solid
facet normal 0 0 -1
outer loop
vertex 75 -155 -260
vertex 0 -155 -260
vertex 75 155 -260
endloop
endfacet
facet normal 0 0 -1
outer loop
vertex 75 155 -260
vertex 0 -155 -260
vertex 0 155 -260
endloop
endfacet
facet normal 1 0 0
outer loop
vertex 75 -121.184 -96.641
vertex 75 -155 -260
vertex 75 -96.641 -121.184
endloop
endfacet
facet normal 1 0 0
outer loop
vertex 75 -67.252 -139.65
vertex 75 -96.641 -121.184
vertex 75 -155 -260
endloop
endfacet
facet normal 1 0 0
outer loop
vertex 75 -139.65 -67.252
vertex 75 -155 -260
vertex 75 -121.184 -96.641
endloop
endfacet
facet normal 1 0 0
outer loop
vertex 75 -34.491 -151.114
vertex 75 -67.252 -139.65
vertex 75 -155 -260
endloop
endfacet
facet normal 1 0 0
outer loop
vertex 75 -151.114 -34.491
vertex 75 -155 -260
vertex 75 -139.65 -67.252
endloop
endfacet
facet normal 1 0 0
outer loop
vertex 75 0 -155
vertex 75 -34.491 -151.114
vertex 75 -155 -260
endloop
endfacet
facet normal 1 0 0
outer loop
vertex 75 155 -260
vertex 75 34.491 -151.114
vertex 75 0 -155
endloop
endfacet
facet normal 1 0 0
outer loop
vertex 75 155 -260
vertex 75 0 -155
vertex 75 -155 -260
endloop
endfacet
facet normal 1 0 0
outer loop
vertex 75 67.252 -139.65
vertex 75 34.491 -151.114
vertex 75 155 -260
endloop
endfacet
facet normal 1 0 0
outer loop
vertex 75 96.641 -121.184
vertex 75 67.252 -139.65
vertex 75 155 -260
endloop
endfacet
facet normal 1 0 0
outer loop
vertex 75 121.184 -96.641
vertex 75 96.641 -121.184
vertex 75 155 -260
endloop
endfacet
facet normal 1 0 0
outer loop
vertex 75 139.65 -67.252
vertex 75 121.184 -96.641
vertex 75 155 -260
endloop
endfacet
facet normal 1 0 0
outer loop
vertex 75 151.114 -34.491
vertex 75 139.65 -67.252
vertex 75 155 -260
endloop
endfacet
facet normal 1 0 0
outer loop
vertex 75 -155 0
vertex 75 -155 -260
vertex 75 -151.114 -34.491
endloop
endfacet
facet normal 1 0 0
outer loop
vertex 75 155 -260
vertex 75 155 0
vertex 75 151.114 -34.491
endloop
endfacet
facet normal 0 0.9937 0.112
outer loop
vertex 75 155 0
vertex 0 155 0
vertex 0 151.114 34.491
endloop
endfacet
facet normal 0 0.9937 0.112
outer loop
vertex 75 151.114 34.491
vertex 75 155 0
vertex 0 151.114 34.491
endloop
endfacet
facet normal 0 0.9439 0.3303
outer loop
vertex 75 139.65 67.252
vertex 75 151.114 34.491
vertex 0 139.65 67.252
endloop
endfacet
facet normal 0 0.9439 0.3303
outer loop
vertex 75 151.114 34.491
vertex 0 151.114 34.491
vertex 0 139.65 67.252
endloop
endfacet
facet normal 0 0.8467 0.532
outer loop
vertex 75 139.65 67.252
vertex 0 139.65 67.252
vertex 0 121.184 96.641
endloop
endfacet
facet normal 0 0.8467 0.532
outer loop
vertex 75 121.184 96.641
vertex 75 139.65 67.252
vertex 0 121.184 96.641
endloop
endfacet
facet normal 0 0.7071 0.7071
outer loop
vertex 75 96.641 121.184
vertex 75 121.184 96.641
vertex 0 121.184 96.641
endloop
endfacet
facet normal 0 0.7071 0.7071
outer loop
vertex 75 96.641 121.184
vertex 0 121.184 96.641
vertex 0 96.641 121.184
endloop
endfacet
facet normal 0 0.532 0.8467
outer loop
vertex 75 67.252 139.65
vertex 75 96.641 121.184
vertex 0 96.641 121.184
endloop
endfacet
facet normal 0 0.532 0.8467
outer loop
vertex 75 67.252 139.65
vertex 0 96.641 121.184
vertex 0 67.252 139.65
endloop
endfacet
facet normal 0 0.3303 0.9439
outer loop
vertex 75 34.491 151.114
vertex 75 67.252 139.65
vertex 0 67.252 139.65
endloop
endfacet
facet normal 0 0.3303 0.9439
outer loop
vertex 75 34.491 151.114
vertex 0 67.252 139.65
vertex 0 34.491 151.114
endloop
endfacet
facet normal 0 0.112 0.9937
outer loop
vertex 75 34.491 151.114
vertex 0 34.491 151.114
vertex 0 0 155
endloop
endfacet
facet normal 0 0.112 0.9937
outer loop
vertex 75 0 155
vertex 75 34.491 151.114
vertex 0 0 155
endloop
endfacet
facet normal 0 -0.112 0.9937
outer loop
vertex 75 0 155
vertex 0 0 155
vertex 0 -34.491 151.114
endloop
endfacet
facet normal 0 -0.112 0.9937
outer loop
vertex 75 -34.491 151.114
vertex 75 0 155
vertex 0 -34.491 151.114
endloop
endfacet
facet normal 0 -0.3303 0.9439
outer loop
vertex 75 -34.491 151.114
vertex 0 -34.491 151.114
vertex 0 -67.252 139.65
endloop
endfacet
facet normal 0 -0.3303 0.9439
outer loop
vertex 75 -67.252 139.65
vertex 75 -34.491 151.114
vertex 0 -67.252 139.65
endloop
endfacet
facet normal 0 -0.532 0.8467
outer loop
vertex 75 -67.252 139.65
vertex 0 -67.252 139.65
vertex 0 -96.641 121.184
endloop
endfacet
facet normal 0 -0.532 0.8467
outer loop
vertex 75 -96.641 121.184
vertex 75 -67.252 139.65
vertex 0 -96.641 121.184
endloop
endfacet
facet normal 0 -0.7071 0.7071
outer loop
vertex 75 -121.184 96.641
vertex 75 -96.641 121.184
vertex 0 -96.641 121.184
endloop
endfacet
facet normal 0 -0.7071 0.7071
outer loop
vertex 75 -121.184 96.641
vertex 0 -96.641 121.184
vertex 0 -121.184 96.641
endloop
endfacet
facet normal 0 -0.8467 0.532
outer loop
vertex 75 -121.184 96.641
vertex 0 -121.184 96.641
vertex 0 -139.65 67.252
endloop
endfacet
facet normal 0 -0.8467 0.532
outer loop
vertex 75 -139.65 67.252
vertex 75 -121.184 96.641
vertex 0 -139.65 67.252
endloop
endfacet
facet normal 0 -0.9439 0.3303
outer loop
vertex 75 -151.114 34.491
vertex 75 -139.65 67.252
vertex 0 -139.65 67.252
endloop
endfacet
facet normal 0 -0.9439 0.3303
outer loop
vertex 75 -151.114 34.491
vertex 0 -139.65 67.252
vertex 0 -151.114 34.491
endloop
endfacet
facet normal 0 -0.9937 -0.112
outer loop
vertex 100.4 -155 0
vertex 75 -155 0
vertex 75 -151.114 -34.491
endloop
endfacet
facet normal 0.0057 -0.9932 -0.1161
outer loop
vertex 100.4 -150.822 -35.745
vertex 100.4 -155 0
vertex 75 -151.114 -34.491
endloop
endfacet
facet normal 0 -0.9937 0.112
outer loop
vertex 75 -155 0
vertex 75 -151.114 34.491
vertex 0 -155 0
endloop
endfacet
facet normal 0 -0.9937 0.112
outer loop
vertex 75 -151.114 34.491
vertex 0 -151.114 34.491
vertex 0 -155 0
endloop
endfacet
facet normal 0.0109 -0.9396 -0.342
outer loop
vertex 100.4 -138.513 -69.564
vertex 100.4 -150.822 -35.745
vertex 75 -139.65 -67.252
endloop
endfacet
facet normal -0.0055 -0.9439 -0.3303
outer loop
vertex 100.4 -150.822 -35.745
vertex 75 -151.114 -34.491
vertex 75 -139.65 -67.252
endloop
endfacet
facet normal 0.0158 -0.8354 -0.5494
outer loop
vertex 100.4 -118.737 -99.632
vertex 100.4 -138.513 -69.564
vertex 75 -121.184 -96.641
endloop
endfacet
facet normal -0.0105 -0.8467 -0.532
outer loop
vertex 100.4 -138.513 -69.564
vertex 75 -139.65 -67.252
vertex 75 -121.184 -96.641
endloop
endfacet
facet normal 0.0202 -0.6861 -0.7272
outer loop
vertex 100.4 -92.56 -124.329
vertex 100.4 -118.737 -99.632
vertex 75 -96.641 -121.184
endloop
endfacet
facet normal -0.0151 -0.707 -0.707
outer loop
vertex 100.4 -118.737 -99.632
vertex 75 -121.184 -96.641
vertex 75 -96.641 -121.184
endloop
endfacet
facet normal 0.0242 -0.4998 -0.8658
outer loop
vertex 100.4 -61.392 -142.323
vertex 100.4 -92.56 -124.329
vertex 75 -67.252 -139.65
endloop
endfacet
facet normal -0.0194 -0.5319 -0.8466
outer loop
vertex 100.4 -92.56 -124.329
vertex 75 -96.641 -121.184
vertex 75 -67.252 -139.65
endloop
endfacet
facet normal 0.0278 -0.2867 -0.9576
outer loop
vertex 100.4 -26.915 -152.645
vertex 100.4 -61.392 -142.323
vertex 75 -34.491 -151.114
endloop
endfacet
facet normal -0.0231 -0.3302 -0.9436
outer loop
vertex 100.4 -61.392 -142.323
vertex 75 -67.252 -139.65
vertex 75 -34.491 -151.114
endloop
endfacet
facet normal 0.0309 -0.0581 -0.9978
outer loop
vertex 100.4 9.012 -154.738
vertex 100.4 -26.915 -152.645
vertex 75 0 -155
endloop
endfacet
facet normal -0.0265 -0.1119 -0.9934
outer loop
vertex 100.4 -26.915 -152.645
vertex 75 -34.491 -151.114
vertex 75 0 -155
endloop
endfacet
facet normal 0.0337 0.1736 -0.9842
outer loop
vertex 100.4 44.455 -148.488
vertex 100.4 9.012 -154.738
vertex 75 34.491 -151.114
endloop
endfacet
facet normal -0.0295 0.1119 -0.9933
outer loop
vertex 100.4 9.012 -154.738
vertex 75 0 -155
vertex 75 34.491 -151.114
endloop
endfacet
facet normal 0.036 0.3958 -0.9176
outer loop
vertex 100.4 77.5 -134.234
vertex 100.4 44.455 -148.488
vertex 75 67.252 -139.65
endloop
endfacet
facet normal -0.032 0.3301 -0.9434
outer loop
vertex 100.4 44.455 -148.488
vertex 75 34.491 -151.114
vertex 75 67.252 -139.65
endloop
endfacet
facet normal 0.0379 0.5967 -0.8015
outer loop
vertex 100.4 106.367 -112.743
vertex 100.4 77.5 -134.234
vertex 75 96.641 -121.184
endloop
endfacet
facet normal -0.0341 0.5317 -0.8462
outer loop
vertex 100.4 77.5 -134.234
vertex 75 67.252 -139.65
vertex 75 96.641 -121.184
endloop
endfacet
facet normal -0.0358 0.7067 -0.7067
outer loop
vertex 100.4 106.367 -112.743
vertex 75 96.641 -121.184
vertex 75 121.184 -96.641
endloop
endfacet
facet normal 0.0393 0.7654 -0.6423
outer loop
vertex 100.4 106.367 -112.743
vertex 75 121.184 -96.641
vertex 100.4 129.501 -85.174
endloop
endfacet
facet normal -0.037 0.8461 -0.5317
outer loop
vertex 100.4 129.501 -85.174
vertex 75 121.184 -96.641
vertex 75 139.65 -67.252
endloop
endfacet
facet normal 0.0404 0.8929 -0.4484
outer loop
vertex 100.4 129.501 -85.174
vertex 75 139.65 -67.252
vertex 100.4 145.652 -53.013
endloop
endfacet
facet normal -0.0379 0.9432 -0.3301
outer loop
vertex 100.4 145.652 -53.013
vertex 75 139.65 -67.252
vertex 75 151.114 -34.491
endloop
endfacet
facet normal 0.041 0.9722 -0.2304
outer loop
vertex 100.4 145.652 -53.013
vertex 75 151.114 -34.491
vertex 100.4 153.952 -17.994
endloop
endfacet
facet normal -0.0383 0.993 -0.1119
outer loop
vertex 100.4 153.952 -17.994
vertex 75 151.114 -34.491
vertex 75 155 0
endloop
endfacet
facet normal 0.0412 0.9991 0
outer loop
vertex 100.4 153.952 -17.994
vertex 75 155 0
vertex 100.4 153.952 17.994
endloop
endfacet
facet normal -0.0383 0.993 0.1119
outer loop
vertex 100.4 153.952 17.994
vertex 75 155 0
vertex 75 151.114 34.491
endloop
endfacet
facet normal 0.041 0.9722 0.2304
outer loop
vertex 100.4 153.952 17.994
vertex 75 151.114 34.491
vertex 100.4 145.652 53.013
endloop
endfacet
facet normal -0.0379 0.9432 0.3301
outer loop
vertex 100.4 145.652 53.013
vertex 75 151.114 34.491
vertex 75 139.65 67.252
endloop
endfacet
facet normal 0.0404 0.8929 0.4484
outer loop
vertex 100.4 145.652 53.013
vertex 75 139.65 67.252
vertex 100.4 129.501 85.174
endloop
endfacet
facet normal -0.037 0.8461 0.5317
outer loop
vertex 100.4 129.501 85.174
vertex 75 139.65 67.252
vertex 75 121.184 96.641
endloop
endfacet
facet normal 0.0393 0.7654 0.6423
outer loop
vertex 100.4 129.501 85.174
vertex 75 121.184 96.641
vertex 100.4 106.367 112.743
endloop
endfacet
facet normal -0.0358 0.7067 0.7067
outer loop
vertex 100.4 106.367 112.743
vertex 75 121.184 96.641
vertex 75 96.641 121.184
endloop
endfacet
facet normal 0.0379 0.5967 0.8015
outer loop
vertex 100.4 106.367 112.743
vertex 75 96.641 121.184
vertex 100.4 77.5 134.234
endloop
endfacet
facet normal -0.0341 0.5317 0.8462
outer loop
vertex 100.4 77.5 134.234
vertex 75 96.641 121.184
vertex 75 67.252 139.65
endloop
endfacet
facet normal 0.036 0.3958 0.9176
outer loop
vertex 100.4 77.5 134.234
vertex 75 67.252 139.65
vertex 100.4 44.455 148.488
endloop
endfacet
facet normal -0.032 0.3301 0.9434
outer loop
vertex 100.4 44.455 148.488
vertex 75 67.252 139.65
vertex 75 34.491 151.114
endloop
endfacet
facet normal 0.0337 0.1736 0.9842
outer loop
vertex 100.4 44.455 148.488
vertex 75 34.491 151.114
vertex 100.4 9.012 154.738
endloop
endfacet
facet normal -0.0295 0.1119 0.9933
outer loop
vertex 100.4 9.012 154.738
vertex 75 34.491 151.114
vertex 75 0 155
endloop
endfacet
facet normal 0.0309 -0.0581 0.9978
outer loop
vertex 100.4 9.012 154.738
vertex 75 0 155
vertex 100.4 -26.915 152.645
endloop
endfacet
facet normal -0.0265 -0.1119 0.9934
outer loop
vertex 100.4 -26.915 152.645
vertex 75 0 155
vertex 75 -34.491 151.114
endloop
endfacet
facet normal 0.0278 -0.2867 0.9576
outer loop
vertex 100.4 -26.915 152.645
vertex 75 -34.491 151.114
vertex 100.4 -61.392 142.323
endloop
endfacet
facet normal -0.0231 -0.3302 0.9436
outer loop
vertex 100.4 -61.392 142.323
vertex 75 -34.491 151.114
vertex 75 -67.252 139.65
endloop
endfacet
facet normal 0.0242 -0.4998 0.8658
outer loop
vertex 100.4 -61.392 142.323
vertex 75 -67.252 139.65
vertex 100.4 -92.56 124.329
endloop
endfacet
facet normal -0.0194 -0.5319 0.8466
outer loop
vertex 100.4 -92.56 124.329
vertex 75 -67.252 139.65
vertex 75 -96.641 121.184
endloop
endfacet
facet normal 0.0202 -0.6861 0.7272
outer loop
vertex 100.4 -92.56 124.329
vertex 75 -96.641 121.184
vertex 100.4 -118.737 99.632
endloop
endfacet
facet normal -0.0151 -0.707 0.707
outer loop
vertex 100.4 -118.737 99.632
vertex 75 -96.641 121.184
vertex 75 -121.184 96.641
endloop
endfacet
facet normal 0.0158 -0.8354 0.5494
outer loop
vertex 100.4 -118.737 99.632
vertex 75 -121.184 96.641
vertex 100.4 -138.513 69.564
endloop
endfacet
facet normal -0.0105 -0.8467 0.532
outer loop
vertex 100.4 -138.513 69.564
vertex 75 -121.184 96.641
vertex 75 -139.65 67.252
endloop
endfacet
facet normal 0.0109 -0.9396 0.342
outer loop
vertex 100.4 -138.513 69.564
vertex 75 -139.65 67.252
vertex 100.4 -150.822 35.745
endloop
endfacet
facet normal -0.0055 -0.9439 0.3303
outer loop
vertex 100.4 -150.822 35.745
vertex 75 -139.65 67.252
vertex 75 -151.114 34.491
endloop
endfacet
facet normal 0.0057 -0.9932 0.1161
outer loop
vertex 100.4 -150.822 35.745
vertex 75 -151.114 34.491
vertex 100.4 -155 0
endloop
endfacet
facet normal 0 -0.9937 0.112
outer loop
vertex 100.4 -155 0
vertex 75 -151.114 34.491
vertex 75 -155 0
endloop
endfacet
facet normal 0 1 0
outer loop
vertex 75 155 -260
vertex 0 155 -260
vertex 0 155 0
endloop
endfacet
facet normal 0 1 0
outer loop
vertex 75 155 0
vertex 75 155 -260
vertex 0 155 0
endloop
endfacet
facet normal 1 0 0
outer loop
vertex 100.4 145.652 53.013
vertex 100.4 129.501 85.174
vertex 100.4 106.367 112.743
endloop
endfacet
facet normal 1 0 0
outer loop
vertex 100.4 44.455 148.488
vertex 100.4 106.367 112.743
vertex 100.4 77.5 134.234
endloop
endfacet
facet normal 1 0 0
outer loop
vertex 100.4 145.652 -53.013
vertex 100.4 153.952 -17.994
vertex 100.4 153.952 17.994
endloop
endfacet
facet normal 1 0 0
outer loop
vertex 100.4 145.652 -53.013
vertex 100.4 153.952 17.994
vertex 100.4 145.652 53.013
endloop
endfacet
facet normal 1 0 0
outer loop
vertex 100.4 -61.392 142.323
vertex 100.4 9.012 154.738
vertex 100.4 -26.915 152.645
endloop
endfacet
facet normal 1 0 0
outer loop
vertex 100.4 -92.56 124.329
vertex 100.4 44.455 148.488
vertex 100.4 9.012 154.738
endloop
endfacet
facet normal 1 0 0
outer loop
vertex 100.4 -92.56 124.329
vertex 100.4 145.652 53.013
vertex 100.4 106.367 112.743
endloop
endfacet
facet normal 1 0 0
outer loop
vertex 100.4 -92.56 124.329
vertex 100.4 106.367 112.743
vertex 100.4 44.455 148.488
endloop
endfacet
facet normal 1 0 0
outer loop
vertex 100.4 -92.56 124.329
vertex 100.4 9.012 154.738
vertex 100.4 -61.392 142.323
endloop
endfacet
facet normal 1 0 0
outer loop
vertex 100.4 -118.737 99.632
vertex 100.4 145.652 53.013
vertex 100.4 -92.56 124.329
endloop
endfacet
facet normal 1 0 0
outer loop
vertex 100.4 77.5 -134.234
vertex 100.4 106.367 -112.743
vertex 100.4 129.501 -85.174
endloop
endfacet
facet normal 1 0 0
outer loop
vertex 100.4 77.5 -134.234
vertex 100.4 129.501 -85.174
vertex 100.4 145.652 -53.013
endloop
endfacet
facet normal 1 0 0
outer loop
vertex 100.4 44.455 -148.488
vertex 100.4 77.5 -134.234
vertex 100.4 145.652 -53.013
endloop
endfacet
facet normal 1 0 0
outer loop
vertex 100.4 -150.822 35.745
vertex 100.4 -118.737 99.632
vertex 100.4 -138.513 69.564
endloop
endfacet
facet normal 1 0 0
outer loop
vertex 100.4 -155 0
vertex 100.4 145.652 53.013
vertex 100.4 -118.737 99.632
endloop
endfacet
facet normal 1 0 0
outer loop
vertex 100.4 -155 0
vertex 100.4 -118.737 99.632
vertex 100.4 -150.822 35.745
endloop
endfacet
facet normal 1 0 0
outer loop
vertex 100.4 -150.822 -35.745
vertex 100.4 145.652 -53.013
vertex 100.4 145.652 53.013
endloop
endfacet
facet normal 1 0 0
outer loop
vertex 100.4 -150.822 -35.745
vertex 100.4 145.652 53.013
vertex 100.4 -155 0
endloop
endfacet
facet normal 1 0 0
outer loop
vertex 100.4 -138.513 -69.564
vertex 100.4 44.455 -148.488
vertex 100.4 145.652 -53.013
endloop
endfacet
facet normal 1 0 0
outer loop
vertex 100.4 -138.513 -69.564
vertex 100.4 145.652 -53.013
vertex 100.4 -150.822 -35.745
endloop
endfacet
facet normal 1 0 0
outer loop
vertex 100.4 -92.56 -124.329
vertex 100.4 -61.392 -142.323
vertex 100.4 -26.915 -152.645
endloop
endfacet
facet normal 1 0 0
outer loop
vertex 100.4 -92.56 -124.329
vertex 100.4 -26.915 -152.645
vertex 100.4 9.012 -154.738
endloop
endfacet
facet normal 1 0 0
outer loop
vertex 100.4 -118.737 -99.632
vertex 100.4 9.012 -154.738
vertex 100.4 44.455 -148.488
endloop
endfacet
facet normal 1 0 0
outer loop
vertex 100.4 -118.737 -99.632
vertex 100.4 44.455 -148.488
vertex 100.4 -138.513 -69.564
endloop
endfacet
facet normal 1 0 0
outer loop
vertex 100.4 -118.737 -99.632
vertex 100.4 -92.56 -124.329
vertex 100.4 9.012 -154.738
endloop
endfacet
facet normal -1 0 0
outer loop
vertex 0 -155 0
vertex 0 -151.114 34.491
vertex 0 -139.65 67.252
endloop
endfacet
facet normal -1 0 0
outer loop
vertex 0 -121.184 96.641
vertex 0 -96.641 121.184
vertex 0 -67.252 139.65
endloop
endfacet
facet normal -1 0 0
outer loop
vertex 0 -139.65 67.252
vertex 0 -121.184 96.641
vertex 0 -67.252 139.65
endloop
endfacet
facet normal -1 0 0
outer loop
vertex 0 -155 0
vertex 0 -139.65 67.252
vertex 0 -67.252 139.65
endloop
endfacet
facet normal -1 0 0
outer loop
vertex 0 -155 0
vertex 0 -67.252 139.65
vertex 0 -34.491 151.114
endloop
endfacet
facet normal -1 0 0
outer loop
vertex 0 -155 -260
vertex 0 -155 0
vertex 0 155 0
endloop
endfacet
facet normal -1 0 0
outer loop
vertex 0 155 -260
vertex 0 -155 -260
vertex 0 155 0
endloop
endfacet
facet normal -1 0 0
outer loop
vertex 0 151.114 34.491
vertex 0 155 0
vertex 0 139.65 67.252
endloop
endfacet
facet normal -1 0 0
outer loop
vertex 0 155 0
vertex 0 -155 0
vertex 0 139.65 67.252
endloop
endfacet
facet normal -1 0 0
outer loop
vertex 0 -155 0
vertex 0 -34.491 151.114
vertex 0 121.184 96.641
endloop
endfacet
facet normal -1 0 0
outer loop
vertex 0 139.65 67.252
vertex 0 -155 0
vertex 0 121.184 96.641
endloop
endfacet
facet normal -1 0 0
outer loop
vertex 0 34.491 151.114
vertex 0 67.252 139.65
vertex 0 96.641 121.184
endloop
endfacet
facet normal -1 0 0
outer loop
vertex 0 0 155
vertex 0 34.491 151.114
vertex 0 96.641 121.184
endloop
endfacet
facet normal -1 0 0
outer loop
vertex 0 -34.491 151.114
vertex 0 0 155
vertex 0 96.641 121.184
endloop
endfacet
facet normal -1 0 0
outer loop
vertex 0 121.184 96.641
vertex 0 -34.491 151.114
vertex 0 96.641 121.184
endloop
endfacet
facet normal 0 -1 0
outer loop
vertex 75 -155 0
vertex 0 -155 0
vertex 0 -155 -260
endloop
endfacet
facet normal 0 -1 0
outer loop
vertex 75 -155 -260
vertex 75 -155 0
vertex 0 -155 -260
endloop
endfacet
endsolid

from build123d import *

# Parameters (mm, degrees)
BOSS_EXTRUDE1_DEPTH = 75
SKETCH2_R           = 155
BOSS_EXTRUDE2_DEPTH = 25.4


with BuildPart() as part:
    # Sketch1 → Boss-Extrude1 (new body)
    with BuildSketch(Plane.YZ):
        with BuildLine():
            Line((-155, 0), (-155, -260))
            Line((-155, -260), (155, -260))
            Line((155, -260), (155, 0))
            ThreePointArc((155, 0), (0, 155), (-155, 0))
        make_face()
    extrude(amount=BOSS_EXTRUDE1_DEPTH)

    # Sketch2 → Boss-Extrude2 (add)
    with BuildSketch(Plane(origin=(75, 0, 0), x_dir=(0, 0, -1), z_dir=(1, 0, 0))):
        with Locations(Location((0, 0, 0), (0, 0, 270))):
            Circle(SKETCH2_R)
    extrude(amount=BOSS_EXTRUDE2_DEPTH)


solid = part.part
